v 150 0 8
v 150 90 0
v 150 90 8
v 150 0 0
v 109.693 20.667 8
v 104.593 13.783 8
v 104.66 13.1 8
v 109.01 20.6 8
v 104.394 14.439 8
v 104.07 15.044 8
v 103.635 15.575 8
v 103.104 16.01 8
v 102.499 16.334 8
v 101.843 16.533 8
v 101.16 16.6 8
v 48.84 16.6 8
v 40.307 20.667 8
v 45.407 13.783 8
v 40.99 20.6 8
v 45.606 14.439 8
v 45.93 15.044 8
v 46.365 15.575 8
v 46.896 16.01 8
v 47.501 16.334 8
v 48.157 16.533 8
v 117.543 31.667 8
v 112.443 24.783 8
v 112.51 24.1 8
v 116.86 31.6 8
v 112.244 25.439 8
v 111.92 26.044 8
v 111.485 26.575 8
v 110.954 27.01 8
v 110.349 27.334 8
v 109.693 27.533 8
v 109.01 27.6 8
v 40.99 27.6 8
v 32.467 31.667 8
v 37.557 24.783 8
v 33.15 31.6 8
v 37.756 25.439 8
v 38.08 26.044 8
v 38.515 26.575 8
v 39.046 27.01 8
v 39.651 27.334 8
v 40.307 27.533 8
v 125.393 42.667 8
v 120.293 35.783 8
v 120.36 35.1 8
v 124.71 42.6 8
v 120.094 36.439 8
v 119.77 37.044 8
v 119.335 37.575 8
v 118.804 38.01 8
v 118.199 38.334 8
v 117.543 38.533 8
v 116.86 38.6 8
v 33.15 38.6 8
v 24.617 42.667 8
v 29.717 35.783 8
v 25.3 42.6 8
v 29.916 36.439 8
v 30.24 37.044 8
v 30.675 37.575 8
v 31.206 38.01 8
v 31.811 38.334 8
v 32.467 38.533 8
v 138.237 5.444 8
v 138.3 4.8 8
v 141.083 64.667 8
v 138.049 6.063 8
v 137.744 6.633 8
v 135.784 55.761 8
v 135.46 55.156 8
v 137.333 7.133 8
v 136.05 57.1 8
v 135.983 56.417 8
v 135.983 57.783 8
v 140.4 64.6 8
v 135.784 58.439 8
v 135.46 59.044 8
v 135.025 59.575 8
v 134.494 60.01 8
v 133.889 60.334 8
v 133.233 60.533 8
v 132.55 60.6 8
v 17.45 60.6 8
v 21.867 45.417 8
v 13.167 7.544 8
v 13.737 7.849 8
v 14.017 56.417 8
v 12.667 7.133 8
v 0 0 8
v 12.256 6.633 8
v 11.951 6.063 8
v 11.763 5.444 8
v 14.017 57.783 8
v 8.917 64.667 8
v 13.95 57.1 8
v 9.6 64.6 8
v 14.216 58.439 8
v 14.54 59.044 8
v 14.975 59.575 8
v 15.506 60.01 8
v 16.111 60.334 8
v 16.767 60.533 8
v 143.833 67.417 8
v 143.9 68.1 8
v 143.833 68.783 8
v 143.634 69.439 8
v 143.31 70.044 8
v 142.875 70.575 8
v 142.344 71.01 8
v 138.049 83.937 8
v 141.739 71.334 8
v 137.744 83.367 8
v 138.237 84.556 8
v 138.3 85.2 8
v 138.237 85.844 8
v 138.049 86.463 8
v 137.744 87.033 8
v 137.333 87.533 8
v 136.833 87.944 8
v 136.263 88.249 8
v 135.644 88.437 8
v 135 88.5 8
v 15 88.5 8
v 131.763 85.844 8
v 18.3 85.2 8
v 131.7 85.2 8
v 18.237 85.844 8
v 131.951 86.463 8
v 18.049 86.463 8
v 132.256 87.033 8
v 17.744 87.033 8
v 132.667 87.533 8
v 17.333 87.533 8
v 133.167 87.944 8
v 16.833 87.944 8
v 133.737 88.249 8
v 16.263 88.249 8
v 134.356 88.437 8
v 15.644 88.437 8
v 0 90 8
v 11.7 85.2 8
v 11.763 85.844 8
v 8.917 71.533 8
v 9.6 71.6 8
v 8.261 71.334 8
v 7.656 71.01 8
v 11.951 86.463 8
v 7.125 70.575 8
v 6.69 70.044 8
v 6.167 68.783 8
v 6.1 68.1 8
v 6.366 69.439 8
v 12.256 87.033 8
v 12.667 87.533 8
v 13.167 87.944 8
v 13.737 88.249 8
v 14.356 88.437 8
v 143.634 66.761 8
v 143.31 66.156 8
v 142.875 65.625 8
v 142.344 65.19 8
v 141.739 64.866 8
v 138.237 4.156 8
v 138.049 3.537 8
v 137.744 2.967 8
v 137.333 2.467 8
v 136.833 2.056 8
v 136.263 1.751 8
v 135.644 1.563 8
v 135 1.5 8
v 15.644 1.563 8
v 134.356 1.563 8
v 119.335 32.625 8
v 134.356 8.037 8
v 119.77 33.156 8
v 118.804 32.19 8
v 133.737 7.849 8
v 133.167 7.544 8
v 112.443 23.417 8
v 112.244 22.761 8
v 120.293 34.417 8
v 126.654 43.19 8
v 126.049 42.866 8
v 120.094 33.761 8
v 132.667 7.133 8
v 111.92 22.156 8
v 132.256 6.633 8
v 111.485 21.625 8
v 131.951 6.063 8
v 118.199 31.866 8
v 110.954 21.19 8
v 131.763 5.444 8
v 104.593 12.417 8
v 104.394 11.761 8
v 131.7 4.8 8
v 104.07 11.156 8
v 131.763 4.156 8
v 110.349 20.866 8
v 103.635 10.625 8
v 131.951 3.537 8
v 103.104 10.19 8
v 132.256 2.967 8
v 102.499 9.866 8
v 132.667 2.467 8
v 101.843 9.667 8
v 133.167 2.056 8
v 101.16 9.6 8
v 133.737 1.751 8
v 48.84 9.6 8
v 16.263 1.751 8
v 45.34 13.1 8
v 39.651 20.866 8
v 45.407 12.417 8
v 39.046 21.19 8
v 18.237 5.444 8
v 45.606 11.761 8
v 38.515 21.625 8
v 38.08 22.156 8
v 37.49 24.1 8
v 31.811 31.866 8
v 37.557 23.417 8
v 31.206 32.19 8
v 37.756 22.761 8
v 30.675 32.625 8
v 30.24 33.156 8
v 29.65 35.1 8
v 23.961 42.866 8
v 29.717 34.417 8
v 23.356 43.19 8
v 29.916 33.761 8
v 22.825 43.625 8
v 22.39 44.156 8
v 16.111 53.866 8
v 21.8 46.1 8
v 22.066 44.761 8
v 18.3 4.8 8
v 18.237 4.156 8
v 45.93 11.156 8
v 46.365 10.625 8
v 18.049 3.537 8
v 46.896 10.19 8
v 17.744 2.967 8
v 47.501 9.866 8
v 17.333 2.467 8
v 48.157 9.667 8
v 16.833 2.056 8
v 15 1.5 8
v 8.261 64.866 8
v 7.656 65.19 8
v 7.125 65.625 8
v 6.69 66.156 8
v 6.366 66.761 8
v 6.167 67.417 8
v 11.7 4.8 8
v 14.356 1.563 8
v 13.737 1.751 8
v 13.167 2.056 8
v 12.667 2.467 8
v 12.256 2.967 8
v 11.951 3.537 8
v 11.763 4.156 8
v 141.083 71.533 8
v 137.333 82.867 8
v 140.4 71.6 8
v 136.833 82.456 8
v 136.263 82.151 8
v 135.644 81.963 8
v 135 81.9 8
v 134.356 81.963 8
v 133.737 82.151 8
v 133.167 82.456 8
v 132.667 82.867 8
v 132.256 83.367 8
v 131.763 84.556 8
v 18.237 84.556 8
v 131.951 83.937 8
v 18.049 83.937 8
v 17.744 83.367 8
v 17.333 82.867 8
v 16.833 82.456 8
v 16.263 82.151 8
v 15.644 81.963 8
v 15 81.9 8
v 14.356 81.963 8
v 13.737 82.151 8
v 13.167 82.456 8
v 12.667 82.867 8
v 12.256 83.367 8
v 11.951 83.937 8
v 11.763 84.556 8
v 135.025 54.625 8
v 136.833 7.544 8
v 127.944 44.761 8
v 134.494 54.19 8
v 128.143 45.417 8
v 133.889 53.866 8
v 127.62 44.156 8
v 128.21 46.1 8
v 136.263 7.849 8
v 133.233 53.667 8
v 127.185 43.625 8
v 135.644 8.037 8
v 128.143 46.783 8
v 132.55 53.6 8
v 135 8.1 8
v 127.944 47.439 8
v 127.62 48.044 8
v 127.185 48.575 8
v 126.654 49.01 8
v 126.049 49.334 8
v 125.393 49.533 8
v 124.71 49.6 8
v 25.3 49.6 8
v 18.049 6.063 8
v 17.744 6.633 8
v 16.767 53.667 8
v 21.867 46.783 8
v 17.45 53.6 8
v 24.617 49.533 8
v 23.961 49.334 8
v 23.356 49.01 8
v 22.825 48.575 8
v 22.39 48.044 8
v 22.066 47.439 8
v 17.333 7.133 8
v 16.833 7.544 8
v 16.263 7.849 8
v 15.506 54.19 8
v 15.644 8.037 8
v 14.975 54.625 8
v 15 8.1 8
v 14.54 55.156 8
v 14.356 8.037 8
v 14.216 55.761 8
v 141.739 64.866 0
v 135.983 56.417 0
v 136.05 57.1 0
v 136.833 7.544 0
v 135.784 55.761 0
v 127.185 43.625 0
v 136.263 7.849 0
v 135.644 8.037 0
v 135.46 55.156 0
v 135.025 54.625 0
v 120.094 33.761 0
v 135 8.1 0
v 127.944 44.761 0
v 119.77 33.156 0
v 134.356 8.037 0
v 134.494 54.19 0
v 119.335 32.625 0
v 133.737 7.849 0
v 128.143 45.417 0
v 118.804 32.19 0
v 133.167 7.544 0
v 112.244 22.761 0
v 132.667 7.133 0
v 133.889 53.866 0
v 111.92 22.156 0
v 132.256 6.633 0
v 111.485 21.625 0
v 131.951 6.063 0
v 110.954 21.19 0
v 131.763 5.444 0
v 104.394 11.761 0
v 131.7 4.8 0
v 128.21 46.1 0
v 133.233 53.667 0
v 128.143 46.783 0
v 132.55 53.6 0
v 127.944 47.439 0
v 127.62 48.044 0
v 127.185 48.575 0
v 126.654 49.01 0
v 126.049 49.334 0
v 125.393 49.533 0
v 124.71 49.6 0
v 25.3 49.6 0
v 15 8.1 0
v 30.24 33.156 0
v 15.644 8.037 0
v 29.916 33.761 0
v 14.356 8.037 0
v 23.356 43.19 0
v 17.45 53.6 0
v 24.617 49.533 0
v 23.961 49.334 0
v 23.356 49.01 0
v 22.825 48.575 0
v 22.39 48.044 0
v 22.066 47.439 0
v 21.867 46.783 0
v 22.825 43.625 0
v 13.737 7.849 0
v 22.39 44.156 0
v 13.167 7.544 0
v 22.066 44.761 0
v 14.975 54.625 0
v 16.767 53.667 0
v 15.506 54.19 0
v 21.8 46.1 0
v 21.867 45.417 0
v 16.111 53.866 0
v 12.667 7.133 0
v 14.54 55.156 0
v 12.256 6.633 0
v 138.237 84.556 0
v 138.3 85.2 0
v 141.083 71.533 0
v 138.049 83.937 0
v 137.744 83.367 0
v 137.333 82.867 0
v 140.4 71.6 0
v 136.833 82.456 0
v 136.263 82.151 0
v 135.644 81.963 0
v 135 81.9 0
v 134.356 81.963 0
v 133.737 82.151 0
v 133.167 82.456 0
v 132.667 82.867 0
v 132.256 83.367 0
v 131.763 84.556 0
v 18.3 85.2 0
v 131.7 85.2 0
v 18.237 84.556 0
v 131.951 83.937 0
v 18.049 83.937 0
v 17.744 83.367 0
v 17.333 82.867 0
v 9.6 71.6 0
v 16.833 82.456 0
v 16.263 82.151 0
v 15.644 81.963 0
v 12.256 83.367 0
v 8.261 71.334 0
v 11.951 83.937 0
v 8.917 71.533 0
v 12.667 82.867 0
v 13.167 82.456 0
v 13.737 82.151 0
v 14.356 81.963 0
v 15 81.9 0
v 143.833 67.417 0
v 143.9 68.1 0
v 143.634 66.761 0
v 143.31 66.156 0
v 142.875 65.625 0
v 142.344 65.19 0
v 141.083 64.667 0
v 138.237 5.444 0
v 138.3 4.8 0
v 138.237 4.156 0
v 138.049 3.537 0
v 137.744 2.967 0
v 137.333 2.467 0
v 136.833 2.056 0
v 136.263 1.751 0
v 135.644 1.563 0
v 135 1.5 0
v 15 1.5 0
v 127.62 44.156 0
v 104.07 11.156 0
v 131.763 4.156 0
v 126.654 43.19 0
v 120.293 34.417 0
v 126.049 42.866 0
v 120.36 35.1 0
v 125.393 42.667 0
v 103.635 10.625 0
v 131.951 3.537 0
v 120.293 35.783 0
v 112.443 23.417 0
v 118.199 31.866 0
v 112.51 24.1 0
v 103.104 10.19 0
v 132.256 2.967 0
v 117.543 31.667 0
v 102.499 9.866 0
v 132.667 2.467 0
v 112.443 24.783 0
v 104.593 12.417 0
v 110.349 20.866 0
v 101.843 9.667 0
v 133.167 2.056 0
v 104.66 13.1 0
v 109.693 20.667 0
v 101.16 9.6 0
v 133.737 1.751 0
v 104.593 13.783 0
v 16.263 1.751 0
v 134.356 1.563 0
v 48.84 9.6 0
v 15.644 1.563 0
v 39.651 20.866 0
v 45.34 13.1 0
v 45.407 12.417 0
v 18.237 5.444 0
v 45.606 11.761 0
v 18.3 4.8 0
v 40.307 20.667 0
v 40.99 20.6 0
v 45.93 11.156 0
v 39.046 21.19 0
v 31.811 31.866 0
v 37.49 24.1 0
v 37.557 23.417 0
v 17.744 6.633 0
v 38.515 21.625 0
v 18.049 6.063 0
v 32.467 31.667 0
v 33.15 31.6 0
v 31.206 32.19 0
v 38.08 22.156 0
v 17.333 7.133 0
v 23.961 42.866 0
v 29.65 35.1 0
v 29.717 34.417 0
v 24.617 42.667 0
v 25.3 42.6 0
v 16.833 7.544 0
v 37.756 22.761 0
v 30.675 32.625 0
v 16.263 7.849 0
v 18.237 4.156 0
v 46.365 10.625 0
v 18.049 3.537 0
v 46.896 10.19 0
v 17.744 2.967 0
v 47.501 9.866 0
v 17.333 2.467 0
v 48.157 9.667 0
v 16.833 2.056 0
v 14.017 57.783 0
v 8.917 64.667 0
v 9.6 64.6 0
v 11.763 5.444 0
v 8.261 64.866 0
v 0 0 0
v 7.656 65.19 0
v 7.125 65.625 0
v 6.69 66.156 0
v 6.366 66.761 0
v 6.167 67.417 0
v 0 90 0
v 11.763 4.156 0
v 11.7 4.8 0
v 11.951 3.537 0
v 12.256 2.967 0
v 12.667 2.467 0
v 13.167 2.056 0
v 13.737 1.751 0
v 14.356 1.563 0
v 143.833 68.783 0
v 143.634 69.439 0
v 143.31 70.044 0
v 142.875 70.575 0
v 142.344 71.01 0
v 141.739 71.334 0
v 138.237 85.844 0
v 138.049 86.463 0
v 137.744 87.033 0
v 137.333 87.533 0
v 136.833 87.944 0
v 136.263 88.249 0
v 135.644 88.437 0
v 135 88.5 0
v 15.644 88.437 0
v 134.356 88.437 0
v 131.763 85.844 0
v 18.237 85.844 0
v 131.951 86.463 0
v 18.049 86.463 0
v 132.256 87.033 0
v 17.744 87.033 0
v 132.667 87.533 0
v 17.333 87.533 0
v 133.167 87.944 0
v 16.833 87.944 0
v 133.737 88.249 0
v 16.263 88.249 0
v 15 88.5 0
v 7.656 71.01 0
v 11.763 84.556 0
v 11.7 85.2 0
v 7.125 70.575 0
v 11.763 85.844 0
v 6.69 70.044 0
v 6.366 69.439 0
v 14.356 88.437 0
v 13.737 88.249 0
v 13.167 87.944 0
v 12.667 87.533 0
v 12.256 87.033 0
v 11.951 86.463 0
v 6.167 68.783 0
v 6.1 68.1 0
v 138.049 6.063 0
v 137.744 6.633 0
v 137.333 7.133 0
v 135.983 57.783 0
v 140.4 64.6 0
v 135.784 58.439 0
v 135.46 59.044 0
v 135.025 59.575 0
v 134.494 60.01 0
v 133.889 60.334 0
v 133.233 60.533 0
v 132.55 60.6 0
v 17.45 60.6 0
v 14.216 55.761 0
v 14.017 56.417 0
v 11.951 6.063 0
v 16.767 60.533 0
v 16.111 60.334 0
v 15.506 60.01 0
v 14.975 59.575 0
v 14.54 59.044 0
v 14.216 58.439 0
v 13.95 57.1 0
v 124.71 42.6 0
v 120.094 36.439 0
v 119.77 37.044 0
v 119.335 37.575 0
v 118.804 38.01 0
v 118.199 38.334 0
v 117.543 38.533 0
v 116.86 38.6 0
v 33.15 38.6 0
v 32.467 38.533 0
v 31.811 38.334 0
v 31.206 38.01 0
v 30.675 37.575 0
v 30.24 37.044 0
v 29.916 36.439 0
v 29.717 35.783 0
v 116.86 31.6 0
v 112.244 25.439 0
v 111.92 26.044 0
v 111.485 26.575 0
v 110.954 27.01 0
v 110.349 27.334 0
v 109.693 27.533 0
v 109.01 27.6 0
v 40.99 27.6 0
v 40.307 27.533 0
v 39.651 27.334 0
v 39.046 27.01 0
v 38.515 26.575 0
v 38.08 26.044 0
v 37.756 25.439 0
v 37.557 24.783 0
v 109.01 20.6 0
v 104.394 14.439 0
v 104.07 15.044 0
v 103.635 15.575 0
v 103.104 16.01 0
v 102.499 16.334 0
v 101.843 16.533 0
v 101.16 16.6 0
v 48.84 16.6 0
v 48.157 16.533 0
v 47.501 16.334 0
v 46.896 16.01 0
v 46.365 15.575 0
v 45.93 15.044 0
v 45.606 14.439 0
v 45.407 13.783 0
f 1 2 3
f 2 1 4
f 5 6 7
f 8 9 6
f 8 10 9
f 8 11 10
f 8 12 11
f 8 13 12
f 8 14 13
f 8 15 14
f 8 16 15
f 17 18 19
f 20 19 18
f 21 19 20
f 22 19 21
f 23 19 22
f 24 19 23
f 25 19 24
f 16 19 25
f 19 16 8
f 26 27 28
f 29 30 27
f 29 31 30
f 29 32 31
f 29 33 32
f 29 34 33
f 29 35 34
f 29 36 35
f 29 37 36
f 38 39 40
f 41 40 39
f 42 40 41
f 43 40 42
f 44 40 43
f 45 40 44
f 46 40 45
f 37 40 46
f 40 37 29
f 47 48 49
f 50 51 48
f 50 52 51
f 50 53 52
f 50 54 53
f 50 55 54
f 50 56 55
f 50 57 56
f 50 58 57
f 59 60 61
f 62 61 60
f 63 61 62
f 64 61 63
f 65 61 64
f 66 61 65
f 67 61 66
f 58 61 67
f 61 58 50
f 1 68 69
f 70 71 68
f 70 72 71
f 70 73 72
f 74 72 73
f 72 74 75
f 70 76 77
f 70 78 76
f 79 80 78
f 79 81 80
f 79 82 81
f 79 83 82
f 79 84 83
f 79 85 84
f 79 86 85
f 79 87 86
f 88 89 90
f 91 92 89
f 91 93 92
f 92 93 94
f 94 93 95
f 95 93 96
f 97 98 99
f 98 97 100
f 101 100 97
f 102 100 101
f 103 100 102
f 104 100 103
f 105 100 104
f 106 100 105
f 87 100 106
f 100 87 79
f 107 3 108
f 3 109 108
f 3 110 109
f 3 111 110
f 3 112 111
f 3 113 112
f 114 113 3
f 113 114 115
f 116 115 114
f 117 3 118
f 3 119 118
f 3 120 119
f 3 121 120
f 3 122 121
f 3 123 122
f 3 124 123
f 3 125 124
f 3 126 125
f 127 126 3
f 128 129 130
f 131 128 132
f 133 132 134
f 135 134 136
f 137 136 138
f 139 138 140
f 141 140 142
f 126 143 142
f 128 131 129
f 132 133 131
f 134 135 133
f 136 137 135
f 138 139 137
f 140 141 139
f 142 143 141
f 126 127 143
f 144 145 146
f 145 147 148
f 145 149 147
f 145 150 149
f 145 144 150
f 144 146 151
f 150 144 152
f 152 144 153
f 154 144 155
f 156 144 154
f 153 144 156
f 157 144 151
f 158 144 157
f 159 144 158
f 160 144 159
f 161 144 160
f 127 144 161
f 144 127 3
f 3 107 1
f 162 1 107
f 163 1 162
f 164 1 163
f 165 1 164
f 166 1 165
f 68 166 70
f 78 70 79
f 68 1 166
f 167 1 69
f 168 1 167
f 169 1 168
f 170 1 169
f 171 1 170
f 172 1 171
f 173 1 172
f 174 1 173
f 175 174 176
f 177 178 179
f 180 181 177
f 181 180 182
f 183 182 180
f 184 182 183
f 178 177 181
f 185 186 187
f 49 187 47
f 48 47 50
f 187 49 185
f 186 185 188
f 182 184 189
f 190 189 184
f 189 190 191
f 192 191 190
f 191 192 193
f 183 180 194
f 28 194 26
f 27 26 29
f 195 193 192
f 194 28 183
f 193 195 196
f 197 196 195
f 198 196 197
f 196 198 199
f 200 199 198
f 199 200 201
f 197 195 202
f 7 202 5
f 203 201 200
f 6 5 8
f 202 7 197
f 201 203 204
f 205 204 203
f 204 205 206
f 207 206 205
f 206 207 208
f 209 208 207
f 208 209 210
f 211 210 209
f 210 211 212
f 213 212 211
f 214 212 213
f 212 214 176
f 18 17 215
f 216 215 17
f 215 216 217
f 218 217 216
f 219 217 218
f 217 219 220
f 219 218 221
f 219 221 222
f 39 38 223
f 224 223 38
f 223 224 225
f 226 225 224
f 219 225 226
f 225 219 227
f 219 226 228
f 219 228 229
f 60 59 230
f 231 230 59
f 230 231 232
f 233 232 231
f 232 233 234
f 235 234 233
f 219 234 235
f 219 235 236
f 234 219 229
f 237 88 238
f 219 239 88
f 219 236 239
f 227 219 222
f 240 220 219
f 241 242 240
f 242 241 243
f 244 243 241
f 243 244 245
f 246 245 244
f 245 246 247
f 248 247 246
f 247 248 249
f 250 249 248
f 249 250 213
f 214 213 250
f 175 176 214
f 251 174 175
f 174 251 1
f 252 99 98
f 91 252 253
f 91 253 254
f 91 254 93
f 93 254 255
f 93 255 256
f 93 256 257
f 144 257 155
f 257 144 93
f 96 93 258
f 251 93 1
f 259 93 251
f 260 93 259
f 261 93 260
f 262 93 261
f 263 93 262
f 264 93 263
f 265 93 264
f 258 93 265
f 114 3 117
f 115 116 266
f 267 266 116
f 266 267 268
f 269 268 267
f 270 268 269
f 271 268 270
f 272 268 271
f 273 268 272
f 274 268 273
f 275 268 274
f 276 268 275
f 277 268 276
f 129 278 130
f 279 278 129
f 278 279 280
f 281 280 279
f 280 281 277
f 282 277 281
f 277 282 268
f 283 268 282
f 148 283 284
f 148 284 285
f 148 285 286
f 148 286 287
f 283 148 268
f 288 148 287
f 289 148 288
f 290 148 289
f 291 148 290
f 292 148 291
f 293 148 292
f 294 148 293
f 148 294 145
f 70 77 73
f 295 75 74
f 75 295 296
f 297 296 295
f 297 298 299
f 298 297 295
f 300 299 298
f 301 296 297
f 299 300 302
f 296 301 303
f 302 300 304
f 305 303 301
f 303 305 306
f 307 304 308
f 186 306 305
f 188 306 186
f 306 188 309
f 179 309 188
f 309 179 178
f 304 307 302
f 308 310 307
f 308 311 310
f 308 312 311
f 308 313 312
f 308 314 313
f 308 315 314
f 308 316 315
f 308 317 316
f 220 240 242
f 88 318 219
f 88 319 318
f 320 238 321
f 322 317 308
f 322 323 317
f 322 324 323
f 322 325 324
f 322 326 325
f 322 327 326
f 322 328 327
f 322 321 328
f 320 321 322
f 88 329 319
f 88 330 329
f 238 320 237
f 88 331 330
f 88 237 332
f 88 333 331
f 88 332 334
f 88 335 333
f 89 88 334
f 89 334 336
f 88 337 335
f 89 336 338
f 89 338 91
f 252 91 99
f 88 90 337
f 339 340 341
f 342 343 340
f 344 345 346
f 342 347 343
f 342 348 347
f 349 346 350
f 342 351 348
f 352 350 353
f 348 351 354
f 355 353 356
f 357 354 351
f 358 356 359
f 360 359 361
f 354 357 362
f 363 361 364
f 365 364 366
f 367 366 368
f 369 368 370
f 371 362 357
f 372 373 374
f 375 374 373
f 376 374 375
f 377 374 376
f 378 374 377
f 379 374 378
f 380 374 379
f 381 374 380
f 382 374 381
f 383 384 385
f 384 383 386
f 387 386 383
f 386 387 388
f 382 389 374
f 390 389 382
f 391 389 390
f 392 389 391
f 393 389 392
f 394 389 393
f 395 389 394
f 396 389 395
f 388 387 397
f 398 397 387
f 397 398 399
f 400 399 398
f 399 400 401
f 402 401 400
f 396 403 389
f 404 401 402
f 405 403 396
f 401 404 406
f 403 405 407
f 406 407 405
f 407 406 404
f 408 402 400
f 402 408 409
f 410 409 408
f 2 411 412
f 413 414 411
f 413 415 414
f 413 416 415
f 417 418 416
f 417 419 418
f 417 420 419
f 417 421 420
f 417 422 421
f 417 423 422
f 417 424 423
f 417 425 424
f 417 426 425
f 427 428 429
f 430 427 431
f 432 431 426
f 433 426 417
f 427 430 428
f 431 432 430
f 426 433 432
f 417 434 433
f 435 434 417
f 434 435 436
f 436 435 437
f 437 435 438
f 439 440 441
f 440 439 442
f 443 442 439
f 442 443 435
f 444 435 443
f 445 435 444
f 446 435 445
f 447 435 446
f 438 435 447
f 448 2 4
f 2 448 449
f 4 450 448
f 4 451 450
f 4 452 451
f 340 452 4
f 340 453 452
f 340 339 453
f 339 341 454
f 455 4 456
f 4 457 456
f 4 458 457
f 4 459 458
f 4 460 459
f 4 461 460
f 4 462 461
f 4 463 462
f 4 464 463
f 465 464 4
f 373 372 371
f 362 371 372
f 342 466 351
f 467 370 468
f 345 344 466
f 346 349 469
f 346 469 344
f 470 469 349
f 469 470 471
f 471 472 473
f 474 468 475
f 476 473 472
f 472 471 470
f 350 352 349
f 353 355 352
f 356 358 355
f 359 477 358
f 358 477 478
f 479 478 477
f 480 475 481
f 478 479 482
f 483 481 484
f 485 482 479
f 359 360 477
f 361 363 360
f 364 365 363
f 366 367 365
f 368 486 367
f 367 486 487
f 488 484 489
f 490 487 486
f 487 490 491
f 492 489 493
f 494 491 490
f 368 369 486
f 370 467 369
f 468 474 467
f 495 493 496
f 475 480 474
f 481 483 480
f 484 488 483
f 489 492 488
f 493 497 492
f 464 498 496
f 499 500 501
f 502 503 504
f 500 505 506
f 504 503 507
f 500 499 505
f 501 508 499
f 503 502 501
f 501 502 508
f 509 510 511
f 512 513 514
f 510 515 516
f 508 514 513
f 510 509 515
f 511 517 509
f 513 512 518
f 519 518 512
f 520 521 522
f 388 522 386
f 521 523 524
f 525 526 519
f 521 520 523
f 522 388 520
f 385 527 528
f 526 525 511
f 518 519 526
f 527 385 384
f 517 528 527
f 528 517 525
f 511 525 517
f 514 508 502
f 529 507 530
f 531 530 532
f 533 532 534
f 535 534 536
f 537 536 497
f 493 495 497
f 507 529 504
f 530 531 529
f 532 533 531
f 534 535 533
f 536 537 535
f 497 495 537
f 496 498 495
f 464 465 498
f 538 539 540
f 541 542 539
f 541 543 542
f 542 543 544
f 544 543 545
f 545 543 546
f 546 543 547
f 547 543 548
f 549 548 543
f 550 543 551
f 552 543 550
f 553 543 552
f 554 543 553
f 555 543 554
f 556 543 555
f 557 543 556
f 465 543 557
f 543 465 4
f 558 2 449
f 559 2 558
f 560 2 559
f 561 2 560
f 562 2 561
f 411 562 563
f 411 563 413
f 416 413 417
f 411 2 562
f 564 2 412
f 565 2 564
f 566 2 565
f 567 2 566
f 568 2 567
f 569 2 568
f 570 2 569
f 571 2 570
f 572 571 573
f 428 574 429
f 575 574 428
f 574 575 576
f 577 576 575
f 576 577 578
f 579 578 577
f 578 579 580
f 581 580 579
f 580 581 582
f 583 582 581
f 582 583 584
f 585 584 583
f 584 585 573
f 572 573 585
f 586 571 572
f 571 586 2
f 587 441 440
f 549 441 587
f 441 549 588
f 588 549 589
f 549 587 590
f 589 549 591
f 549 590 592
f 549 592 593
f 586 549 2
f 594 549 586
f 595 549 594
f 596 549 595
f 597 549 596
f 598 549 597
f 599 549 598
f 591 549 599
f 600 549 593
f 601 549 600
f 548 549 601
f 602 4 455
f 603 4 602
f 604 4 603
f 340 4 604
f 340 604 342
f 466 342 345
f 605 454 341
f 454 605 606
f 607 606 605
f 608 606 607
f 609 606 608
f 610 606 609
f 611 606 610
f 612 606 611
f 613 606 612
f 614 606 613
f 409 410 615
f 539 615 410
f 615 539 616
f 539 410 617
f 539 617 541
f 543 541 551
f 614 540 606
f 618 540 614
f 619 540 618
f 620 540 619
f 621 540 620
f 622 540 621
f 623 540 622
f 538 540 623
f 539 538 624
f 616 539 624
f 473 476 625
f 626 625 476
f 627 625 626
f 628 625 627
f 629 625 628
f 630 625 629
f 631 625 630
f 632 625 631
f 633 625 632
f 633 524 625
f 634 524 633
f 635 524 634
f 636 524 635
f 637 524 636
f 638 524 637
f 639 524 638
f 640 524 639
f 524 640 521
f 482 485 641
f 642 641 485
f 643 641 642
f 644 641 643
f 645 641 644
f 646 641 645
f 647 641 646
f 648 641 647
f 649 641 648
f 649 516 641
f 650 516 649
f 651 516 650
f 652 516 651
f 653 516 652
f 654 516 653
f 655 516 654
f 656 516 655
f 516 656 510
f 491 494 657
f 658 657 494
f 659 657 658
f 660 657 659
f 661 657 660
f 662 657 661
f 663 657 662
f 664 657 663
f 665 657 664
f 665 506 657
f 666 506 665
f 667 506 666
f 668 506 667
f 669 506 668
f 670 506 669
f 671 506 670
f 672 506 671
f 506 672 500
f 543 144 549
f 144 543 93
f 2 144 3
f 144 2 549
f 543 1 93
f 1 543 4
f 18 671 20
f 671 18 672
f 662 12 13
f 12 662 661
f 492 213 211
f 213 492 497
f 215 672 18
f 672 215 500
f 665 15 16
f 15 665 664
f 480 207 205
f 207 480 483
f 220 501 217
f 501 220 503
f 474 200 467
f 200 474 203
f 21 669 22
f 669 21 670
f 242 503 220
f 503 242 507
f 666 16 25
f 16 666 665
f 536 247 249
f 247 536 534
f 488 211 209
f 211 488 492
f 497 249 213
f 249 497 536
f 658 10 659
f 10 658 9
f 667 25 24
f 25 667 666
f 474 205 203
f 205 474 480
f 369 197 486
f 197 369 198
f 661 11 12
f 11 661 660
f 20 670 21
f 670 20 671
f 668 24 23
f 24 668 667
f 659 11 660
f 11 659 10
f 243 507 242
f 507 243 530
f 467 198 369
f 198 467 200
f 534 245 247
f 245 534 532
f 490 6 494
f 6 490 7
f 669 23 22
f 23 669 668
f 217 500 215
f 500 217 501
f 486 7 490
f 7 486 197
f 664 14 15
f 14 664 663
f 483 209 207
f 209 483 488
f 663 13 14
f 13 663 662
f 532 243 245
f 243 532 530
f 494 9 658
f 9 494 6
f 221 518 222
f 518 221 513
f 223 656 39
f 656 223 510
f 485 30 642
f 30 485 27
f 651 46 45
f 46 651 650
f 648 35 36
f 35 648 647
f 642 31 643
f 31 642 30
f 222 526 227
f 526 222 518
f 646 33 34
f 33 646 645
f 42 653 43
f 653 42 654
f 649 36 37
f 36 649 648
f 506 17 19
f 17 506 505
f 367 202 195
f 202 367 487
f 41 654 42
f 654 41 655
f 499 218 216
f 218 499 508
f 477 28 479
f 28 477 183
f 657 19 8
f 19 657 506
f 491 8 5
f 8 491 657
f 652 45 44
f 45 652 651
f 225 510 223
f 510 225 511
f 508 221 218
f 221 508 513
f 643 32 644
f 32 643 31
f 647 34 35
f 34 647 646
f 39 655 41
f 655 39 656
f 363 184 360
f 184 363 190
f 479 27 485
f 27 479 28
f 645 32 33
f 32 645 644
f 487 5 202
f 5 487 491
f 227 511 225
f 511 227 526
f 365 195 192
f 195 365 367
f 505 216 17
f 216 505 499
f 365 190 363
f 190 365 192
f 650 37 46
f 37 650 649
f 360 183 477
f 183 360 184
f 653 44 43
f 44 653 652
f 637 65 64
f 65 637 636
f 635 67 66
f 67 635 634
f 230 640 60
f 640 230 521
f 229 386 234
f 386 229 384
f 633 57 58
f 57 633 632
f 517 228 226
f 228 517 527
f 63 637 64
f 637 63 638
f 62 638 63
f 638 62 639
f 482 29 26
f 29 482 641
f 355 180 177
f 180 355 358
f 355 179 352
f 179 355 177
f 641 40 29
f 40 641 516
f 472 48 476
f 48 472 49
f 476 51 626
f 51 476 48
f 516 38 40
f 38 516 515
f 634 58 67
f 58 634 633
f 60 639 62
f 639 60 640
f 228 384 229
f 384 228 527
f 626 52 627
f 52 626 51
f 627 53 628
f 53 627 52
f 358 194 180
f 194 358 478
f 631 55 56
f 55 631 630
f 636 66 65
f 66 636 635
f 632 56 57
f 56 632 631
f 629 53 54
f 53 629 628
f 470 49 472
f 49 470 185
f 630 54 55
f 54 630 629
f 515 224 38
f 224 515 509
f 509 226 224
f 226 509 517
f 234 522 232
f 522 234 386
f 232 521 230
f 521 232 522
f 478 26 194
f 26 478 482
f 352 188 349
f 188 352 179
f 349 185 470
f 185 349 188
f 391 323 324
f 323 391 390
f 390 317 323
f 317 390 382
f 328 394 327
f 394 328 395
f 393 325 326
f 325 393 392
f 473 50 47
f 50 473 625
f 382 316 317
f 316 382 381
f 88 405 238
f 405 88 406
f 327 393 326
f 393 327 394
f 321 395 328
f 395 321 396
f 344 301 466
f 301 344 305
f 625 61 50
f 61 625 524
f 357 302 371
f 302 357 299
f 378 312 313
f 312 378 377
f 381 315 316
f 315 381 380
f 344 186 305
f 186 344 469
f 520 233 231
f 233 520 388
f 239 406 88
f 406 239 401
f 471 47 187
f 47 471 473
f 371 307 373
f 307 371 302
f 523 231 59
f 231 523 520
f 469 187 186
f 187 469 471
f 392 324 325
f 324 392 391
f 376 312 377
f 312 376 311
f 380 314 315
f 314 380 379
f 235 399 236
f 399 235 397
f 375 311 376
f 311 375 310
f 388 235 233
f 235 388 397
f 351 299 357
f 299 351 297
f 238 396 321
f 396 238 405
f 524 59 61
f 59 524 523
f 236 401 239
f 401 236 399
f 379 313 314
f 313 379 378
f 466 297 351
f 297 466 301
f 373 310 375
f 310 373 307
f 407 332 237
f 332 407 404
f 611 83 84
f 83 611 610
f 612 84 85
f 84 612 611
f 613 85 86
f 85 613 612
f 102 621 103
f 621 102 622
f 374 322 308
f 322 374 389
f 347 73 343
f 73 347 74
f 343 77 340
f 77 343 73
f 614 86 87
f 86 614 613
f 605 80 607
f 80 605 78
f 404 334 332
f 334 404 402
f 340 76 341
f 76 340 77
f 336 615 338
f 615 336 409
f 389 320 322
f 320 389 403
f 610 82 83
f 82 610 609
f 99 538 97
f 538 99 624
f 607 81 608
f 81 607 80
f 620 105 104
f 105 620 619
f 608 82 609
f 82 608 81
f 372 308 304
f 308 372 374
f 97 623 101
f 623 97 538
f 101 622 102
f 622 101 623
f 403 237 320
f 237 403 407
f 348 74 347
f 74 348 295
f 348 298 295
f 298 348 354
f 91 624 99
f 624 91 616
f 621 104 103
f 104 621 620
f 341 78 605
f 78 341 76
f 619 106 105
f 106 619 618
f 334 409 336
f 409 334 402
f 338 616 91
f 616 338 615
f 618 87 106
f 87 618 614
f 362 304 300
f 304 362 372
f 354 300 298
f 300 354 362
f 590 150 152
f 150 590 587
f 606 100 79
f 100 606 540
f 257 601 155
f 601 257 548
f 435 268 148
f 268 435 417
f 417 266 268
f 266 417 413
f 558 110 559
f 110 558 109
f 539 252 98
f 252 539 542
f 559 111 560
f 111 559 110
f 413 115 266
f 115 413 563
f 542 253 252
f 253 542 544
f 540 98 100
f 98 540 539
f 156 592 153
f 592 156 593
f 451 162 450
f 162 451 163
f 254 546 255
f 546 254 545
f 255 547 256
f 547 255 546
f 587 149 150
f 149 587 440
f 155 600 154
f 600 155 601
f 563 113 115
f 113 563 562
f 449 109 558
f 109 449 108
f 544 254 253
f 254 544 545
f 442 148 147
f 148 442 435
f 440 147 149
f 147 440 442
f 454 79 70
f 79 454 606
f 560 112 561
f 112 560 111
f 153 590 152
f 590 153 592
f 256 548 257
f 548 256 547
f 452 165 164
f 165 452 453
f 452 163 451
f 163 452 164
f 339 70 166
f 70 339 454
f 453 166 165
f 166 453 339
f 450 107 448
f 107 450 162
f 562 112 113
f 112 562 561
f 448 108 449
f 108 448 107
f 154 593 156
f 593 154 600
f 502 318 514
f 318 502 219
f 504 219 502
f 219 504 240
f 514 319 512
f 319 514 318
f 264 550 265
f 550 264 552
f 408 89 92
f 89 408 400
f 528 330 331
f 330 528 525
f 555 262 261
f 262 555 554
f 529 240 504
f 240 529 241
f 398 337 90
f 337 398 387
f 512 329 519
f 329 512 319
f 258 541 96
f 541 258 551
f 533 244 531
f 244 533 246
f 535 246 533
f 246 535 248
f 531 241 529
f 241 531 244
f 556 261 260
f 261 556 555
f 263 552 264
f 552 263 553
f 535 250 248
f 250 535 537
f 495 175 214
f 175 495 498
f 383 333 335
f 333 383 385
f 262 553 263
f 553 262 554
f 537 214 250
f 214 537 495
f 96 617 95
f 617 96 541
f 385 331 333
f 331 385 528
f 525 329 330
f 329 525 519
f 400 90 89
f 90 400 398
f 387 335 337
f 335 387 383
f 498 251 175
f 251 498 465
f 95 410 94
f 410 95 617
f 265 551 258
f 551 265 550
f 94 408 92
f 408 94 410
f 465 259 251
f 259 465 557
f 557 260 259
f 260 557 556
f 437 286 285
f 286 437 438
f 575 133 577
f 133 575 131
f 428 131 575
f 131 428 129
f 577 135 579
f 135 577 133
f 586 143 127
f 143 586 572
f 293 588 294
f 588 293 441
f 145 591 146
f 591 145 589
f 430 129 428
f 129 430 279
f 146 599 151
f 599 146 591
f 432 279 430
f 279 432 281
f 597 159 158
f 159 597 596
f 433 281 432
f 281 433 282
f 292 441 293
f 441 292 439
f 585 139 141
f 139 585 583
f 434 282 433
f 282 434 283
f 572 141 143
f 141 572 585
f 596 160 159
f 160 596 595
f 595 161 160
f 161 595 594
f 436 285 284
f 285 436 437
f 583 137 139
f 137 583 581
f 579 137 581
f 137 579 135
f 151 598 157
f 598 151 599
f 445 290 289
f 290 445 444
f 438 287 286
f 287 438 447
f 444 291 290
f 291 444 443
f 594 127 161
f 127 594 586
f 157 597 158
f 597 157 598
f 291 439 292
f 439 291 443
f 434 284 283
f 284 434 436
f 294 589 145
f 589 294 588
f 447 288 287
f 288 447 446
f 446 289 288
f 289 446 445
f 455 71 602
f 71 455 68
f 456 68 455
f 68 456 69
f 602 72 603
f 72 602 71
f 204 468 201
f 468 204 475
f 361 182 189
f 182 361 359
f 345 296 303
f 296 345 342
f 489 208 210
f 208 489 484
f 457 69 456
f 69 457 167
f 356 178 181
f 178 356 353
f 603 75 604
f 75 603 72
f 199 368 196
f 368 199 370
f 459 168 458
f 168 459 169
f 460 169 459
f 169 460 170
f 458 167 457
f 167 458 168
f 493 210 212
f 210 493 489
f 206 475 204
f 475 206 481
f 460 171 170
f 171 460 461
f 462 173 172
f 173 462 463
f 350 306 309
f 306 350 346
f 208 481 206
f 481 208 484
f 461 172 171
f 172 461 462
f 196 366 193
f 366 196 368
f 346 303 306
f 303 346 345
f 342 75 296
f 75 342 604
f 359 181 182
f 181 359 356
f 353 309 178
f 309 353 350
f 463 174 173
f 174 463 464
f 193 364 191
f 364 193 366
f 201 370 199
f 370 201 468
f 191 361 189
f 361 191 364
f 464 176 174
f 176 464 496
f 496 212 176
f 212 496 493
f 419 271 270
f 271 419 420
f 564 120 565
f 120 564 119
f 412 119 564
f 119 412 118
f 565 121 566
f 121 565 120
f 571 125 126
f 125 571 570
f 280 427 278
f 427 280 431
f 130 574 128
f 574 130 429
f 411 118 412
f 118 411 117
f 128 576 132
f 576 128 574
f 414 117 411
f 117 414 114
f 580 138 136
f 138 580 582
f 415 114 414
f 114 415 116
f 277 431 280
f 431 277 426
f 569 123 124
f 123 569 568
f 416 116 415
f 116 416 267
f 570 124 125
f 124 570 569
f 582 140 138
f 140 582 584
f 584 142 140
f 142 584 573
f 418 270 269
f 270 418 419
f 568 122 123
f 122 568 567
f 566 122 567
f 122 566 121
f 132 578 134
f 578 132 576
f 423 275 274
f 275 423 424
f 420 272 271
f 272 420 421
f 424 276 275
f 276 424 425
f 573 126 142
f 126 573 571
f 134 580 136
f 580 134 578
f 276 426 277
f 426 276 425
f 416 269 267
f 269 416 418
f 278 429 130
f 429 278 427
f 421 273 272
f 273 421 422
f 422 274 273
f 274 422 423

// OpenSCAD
$fn = 32;

// ----------------------------------------------------------------------
// Slotted panel: 150 x 90 mm, 6 рядов of slots
// ----------------------------------------------------------------------

// --- parameters (mm) ---
panel_w = 150;            // panel width
panel_d = 90;             // panel depth
thick = 8;                // panel thickness
slot_w = 7;               // slot width
pitch0 = 11;              // first row pitch
pitch_step = 1.8;         // pitch increase per row
margin = 9.6;             // margin around the slot field
rows = 6;                 // number of slot rows
mount_d = 6.6;            // mounting holes
mount_x = 60;             // mounting hole offset

difference() {
  union() {
    cube([panel_w, panel_d, thick]);
  }
  /* slot rows: stadium shaped cutters, 2.5 mm clear of both faces */
  /* row 0: pitch 11, length 52.32 */
  hull() {
    translate([48.84, 13.1, -2.5]) cylinder(h = thick + 5, d = slot_w);
    translate([101.16, 13.1, -2.5]) cylinder(h = thick + 5, d = slot_w);
  }
  /* row 1: pitch 11, length 68.02 */
  hull() {
    translate([40.99, 24.1, -2.5]) cylinder(h = thick + 5, d = slot_w);
    translate([109.01, 24.1, -2.5]) cylinder(h = thick + 5, d = slot_w);
  }
  /* row 2: pitch 11, length 83.71 */
  hull() {
    translate([33.15, 35.1, -2.5]) cylinder(h = thick + 5, d = slot_w);
    translate([116.86, 35.1, -2.5]) cylinder(h = thick + 5, d = slot_w);
  }
  /* row 3: pitch 11, length 99.41 */
  hull() {
    translate([25.3, 46.1, -2.5]) cylinder(h = thick + 5, d = slot_w);
    translate([124.71, 46.1, -2.5]) cylinder(h = thick + 5, d = slot_w);
  }
  /* row 4: pitch 11, length 115.1 */
  hull() {
    translate([17.45, 57.1, -2.5]) cylinder(h = thick + 5, d = slot_w);
    translate([132.55, 57.1, -2.5]) cylinder(h = thick + 5, d = slot_w);
  }
  /* row 5: pitch 11, length 130.8 */
  hull() {
    translate([9.6, 68.1, -2.5]) cylinder(h = thick + 5, d = slot_w);
    translate([140.4, 68.1, -2.5]) cylinder(h = thick + 5, d = slot_w);
  }
  translate([15, 4.8, -2.5]) cylinder(h = 13, d = mount_d);
  translate([15, 85.2, -2.5]) cylinder(h = 13, d = mount_d);
  translate([135, 4.8, -2.5]) cylinder(h = 13, d = mount_d);
  translate([135, 85.2, -2.5]) cylinder(h = 13, d = mount_d);
}
